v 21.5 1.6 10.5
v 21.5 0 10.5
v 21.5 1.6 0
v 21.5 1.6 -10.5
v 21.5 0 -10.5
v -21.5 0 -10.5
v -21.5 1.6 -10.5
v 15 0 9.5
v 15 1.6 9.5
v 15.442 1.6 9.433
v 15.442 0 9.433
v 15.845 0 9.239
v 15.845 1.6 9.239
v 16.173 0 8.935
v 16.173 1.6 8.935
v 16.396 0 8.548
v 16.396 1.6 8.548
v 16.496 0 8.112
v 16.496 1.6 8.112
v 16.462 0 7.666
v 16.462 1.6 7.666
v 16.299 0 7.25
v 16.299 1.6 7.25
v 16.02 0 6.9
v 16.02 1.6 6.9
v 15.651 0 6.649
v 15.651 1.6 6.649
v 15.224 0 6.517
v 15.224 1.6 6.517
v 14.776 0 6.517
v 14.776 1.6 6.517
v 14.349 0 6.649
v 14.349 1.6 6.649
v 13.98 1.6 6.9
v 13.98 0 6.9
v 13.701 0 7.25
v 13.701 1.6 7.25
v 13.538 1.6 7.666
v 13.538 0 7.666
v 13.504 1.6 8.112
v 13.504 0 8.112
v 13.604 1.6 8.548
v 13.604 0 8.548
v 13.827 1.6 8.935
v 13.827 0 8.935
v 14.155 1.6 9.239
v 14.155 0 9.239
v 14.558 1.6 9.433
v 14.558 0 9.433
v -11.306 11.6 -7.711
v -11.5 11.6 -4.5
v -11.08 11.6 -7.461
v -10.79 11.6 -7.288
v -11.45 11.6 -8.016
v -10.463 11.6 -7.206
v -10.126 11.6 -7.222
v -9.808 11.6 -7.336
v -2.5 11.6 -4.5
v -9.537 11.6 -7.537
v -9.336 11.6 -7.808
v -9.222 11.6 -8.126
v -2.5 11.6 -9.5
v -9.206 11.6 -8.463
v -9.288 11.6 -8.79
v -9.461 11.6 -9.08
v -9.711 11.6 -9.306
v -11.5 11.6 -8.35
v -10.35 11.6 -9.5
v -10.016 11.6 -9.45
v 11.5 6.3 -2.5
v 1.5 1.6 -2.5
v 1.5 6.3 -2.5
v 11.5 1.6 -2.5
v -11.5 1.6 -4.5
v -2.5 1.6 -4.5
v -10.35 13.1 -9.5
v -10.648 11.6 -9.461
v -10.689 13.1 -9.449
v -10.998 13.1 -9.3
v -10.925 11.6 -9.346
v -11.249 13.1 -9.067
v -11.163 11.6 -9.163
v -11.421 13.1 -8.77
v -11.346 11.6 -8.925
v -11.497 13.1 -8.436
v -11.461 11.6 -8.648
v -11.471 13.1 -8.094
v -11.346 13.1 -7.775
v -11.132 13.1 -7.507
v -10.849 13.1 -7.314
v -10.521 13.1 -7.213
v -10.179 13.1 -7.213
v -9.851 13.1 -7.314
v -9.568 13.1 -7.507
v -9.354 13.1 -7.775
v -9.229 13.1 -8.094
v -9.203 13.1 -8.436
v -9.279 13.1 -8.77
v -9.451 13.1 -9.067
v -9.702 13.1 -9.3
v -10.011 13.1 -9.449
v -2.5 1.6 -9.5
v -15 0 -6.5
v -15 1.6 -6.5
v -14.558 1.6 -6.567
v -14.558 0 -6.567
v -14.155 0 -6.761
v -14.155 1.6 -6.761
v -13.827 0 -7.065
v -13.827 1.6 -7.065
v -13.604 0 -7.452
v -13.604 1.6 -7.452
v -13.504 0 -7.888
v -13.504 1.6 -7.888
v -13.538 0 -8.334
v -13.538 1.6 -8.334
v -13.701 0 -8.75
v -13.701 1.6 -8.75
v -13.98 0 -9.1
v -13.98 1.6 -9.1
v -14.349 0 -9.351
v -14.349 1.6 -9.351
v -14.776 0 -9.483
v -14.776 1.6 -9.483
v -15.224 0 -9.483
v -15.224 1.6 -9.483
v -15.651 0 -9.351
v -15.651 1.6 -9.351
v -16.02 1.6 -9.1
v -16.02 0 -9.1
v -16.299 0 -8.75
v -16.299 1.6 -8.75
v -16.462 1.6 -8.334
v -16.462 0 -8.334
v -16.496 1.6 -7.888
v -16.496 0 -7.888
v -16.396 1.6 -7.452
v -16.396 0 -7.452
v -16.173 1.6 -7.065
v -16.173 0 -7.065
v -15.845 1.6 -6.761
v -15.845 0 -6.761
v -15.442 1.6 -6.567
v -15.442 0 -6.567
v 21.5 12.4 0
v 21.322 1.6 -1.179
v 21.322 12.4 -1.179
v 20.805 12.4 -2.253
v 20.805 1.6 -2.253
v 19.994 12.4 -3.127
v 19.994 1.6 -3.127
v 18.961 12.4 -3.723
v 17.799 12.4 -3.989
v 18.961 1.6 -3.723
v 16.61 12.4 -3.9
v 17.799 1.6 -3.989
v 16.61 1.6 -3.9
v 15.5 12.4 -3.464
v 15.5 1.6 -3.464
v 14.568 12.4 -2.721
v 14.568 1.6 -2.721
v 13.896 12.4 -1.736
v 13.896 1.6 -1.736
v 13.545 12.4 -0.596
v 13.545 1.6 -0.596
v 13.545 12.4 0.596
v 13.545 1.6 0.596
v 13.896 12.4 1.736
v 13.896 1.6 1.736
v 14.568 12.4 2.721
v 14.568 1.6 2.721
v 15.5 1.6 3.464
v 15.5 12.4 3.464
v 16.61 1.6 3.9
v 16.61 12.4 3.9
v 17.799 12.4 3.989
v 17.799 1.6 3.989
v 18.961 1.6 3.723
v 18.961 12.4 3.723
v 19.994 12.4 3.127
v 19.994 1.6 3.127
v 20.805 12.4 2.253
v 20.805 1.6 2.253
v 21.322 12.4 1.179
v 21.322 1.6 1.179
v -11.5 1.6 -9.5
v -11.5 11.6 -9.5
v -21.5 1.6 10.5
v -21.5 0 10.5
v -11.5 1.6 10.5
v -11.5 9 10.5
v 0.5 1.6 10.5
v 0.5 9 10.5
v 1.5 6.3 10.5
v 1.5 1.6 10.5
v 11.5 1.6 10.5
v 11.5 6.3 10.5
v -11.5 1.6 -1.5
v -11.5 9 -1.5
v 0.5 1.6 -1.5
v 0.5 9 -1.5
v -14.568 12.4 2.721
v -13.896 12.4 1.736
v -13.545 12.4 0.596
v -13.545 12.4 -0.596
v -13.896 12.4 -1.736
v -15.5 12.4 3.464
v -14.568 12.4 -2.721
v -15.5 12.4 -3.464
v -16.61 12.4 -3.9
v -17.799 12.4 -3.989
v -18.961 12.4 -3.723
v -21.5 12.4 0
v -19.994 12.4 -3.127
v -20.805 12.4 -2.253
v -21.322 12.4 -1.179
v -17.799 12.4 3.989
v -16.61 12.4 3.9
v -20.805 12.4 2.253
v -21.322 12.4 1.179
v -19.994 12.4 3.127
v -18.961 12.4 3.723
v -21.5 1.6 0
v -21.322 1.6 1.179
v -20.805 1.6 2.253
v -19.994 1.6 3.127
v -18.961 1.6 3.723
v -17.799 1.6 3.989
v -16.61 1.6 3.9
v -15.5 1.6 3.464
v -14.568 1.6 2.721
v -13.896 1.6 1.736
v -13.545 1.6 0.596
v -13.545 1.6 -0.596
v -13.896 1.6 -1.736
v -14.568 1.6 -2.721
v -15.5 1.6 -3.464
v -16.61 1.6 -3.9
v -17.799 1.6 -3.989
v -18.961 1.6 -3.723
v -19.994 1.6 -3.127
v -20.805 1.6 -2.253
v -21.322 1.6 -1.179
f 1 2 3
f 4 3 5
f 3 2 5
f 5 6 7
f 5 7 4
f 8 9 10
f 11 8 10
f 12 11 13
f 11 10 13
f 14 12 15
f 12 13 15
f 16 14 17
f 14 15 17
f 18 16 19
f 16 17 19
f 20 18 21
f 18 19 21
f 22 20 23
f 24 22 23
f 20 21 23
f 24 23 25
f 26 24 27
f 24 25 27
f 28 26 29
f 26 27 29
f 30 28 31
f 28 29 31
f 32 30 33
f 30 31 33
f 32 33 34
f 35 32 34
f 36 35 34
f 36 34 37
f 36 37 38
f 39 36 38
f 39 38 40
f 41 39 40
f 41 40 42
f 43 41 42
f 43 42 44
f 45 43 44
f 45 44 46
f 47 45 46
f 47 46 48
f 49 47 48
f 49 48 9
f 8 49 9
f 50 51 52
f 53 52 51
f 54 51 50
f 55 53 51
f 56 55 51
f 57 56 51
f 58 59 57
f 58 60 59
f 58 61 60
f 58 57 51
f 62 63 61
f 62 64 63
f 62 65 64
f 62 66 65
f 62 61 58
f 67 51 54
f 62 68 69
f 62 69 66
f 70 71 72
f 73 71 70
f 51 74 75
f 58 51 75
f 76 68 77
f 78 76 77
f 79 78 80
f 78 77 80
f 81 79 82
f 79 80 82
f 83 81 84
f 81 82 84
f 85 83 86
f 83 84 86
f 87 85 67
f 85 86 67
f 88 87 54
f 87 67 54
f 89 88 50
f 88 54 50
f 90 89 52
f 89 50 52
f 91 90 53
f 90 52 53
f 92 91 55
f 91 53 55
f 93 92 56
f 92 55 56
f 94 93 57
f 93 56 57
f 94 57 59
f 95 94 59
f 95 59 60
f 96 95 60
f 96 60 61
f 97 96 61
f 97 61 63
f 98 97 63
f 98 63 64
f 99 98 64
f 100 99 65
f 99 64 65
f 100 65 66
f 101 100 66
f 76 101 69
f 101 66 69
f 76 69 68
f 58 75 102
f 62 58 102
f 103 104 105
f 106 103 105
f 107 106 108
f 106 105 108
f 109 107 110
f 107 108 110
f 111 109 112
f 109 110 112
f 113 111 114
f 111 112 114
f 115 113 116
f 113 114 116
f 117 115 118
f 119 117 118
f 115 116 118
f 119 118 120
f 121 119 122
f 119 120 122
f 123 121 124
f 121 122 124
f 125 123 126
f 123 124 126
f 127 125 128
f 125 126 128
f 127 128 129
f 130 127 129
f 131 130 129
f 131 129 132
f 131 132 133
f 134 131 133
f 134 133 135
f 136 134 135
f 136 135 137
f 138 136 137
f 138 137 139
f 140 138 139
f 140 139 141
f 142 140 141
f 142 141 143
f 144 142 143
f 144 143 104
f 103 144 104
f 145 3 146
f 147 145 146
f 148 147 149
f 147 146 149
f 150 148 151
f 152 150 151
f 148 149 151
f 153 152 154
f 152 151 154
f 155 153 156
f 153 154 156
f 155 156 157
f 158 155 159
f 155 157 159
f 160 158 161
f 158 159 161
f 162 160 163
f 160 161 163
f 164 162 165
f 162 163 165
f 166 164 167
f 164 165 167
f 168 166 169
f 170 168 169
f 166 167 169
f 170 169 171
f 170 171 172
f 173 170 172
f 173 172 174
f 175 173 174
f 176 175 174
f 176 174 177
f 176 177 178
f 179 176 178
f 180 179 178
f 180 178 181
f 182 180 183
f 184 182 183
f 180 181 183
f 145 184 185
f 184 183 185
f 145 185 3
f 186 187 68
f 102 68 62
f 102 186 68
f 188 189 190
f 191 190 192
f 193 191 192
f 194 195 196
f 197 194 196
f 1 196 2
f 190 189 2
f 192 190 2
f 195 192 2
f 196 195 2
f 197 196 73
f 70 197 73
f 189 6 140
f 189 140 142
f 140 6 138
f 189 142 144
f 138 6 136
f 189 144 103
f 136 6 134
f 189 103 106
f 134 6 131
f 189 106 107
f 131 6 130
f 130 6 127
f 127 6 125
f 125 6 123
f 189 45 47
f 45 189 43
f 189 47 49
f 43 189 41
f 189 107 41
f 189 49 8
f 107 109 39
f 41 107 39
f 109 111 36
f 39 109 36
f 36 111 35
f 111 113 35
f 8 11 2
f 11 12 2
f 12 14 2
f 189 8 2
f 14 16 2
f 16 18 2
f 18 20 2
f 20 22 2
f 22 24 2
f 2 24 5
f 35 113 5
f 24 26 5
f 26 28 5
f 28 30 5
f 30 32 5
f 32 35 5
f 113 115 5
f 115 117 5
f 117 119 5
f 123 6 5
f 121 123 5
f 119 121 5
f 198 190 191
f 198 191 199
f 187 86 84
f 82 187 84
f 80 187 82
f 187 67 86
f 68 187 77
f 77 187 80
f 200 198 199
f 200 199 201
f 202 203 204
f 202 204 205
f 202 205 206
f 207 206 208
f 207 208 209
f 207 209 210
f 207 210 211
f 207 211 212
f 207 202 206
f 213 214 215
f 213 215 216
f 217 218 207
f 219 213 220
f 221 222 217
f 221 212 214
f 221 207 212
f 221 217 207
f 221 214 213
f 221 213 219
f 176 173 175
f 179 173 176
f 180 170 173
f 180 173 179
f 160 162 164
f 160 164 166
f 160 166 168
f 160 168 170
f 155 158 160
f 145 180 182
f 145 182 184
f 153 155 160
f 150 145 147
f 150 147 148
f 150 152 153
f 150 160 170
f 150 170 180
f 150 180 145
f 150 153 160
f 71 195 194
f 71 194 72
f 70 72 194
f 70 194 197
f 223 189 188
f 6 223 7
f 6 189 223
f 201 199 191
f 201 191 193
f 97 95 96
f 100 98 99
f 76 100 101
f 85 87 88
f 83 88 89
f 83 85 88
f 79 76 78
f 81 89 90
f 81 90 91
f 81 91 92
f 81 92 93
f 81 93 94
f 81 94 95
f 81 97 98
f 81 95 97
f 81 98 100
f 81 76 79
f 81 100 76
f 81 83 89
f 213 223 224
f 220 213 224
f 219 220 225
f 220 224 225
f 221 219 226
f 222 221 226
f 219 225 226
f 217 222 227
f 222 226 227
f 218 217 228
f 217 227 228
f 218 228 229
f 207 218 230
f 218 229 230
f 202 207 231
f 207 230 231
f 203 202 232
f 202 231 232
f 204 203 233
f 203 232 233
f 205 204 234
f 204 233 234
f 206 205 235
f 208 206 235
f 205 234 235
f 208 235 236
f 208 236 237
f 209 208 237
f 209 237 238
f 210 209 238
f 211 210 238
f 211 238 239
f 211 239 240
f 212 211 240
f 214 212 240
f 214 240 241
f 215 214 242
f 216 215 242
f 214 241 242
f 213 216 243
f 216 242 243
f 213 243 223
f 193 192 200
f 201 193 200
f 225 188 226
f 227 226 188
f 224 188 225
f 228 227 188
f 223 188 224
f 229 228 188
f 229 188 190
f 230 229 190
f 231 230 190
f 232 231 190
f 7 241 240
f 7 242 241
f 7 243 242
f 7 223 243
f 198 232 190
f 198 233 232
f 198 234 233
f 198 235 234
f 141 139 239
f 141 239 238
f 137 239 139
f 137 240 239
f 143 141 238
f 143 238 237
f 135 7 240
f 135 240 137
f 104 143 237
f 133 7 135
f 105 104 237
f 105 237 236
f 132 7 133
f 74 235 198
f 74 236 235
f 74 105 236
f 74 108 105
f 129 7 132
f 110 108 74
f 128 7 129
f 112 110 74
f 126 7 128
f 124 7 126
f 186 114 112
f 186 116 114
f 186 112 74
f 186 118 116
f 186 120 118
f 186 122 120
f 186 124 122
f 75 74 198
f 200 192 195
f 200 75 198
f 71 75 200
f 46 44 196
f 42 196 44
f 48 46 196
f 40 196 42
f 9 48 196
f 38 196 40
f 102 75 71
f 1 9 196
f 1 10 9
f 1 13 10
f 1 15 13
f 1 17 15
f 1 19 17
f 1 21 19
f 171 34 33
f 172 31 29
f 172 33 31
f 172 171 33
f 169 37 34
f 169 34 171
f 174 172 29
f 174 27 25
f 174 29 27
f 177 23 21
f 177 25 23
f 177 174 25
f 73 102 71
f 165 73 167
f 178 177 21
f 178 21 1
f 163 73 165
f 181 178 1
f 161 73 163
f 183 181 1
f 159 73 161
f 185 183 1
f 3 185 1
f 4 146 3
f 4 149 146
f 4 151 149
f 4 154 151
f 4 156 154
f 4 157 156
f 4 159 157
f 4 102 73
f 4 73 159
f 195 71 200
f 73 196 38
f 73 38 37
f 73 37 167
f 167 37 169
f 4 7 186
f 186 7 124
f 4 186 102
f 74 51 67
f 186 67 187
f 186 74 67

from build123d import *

# Parameters (mm, degrees)
SKETCH_1_W          = 43
SKETCH_1_H          = 21
EXTRUDE_1_DEPTH     = 1.6
SKETCH_2_R          = 1.5
CUT_EXTRUDE_1_DEPTH = 24.98040867
SKETCH_2_3_R        = 4
EXTRUDE_2_DEPTH     = 10.8
SKETCH_2_4_W        = 12
SKETCH_2_4_H        = 12
EXTRUDE_3_DEPTH     = 7.4
SKETCH_2_5_W        = 10
SKETCH_2_5_H        = 13
EXTRUDE_4_DEPTH     = 4.7
SKETCH_2_6_W        = 9
SKETCH_2_6_H        = 5
EXTRUDE_5_DEPTH     = 10
SKETCH_3_R          = 1.15
EXTRUDE_6_DEPTH     = 1.5


with BuildPart() as part:
    # Эскиз1 → Бобышка-Вытянуть1 (new body)
    with BuildSketch(Plane(origin=(0, 0, 0), x_dir=(1, 0, 0), z_dir=(0, 1, 0))):
        Rectangle(SKETCH_1_W, SKETCH_1_H)
    extrude(amount=EXTRUDE_1_DEPTH)

    # Эскиз2 → Вырез-Вытянуть1 (cut, through all)
    with BuildSketch(Plane(origin=(0, 1.6, 0), x_dir=(1, 0, 0), z_dir=(0, 1, 0))):
        with Locations((-15, 8)):
            Circle(SKETCH_2_R)
        with Locations((15, -8)):
            Circle(SKETCH_2_R)
    extrude(amount=-CUT_EXTRUDE_1_DEPTH, mode=Mode.SUBTRACT)

    # Эскиз2<3> → Бобышка-Вытянуть2 (add)
    with BuildSketch(Plane(origin=(0, 1.6, 0), x_dir=(1, 0, 0), z_dir=(0, 1, 0))):
        with Locations((-17.5, 0)):
            Circle(SKETCH_2_3_R)
        with Locations((17.5, 0)):
            Circle(SKETCH_2_3_R)
    extrude(amount=EXTRUDE_2_DEPTH)

    # Эскиз2<4> → Бобышка-Вытянуть3 (add)
    with BuildSketch(Plane(origin=(0, 1.6, 0), x_dir=(1, 0, 0), z_dir=(0, 1, 0))):
        with Locations((-5.5, -4.5)):
            Rectangle(SKETCH_2_4_W, SKETCH_2_4_H)
    extrude(amount=EXTRUDE_3_DEPTH)

    # Эскиз2<5> → Бобышка-Вытянуть4 (add)
    with BuildSketch(Plane(origin=(0, 1.6, 0), x_dir=(1, 0, 0), z_dir=(0, 1, 0))):
        with Locations((6.5, -4)):
            Rectangle(SKETCH_2_5_W, SKETCH_2_5_H)
    extrude(amount=EXTRUDE_4_DEPTH)

    # Эскиз2<6> → Бобышка-Вытянуть5 (add)
    with BuildSketch(Plane(origin=(0, 1.6, 0), x_dir=(1, 0, 0), z_dir=(0, 1, 0))):
        with Locations((-7, 7)):
            Rectangle(SKETCH_2_6_W, SKETCH_2_6_H)
    extrude(amount=EXTRUDE_5_DEPTH)

    # Эскиз3 → Бобышка-Вытянуть6 (add)
    with BuildSketch(Plane(origin=(0, 11.6, 0), x_dir=(1, 0, 0), z_dir=(0, 1, 0))):
        with Locations((-10.35, 8.35)):
            Circle(SKETCH_3_R)
    extrude(amount=EXTRUDE_6_DEPTH)


solid = part.part
